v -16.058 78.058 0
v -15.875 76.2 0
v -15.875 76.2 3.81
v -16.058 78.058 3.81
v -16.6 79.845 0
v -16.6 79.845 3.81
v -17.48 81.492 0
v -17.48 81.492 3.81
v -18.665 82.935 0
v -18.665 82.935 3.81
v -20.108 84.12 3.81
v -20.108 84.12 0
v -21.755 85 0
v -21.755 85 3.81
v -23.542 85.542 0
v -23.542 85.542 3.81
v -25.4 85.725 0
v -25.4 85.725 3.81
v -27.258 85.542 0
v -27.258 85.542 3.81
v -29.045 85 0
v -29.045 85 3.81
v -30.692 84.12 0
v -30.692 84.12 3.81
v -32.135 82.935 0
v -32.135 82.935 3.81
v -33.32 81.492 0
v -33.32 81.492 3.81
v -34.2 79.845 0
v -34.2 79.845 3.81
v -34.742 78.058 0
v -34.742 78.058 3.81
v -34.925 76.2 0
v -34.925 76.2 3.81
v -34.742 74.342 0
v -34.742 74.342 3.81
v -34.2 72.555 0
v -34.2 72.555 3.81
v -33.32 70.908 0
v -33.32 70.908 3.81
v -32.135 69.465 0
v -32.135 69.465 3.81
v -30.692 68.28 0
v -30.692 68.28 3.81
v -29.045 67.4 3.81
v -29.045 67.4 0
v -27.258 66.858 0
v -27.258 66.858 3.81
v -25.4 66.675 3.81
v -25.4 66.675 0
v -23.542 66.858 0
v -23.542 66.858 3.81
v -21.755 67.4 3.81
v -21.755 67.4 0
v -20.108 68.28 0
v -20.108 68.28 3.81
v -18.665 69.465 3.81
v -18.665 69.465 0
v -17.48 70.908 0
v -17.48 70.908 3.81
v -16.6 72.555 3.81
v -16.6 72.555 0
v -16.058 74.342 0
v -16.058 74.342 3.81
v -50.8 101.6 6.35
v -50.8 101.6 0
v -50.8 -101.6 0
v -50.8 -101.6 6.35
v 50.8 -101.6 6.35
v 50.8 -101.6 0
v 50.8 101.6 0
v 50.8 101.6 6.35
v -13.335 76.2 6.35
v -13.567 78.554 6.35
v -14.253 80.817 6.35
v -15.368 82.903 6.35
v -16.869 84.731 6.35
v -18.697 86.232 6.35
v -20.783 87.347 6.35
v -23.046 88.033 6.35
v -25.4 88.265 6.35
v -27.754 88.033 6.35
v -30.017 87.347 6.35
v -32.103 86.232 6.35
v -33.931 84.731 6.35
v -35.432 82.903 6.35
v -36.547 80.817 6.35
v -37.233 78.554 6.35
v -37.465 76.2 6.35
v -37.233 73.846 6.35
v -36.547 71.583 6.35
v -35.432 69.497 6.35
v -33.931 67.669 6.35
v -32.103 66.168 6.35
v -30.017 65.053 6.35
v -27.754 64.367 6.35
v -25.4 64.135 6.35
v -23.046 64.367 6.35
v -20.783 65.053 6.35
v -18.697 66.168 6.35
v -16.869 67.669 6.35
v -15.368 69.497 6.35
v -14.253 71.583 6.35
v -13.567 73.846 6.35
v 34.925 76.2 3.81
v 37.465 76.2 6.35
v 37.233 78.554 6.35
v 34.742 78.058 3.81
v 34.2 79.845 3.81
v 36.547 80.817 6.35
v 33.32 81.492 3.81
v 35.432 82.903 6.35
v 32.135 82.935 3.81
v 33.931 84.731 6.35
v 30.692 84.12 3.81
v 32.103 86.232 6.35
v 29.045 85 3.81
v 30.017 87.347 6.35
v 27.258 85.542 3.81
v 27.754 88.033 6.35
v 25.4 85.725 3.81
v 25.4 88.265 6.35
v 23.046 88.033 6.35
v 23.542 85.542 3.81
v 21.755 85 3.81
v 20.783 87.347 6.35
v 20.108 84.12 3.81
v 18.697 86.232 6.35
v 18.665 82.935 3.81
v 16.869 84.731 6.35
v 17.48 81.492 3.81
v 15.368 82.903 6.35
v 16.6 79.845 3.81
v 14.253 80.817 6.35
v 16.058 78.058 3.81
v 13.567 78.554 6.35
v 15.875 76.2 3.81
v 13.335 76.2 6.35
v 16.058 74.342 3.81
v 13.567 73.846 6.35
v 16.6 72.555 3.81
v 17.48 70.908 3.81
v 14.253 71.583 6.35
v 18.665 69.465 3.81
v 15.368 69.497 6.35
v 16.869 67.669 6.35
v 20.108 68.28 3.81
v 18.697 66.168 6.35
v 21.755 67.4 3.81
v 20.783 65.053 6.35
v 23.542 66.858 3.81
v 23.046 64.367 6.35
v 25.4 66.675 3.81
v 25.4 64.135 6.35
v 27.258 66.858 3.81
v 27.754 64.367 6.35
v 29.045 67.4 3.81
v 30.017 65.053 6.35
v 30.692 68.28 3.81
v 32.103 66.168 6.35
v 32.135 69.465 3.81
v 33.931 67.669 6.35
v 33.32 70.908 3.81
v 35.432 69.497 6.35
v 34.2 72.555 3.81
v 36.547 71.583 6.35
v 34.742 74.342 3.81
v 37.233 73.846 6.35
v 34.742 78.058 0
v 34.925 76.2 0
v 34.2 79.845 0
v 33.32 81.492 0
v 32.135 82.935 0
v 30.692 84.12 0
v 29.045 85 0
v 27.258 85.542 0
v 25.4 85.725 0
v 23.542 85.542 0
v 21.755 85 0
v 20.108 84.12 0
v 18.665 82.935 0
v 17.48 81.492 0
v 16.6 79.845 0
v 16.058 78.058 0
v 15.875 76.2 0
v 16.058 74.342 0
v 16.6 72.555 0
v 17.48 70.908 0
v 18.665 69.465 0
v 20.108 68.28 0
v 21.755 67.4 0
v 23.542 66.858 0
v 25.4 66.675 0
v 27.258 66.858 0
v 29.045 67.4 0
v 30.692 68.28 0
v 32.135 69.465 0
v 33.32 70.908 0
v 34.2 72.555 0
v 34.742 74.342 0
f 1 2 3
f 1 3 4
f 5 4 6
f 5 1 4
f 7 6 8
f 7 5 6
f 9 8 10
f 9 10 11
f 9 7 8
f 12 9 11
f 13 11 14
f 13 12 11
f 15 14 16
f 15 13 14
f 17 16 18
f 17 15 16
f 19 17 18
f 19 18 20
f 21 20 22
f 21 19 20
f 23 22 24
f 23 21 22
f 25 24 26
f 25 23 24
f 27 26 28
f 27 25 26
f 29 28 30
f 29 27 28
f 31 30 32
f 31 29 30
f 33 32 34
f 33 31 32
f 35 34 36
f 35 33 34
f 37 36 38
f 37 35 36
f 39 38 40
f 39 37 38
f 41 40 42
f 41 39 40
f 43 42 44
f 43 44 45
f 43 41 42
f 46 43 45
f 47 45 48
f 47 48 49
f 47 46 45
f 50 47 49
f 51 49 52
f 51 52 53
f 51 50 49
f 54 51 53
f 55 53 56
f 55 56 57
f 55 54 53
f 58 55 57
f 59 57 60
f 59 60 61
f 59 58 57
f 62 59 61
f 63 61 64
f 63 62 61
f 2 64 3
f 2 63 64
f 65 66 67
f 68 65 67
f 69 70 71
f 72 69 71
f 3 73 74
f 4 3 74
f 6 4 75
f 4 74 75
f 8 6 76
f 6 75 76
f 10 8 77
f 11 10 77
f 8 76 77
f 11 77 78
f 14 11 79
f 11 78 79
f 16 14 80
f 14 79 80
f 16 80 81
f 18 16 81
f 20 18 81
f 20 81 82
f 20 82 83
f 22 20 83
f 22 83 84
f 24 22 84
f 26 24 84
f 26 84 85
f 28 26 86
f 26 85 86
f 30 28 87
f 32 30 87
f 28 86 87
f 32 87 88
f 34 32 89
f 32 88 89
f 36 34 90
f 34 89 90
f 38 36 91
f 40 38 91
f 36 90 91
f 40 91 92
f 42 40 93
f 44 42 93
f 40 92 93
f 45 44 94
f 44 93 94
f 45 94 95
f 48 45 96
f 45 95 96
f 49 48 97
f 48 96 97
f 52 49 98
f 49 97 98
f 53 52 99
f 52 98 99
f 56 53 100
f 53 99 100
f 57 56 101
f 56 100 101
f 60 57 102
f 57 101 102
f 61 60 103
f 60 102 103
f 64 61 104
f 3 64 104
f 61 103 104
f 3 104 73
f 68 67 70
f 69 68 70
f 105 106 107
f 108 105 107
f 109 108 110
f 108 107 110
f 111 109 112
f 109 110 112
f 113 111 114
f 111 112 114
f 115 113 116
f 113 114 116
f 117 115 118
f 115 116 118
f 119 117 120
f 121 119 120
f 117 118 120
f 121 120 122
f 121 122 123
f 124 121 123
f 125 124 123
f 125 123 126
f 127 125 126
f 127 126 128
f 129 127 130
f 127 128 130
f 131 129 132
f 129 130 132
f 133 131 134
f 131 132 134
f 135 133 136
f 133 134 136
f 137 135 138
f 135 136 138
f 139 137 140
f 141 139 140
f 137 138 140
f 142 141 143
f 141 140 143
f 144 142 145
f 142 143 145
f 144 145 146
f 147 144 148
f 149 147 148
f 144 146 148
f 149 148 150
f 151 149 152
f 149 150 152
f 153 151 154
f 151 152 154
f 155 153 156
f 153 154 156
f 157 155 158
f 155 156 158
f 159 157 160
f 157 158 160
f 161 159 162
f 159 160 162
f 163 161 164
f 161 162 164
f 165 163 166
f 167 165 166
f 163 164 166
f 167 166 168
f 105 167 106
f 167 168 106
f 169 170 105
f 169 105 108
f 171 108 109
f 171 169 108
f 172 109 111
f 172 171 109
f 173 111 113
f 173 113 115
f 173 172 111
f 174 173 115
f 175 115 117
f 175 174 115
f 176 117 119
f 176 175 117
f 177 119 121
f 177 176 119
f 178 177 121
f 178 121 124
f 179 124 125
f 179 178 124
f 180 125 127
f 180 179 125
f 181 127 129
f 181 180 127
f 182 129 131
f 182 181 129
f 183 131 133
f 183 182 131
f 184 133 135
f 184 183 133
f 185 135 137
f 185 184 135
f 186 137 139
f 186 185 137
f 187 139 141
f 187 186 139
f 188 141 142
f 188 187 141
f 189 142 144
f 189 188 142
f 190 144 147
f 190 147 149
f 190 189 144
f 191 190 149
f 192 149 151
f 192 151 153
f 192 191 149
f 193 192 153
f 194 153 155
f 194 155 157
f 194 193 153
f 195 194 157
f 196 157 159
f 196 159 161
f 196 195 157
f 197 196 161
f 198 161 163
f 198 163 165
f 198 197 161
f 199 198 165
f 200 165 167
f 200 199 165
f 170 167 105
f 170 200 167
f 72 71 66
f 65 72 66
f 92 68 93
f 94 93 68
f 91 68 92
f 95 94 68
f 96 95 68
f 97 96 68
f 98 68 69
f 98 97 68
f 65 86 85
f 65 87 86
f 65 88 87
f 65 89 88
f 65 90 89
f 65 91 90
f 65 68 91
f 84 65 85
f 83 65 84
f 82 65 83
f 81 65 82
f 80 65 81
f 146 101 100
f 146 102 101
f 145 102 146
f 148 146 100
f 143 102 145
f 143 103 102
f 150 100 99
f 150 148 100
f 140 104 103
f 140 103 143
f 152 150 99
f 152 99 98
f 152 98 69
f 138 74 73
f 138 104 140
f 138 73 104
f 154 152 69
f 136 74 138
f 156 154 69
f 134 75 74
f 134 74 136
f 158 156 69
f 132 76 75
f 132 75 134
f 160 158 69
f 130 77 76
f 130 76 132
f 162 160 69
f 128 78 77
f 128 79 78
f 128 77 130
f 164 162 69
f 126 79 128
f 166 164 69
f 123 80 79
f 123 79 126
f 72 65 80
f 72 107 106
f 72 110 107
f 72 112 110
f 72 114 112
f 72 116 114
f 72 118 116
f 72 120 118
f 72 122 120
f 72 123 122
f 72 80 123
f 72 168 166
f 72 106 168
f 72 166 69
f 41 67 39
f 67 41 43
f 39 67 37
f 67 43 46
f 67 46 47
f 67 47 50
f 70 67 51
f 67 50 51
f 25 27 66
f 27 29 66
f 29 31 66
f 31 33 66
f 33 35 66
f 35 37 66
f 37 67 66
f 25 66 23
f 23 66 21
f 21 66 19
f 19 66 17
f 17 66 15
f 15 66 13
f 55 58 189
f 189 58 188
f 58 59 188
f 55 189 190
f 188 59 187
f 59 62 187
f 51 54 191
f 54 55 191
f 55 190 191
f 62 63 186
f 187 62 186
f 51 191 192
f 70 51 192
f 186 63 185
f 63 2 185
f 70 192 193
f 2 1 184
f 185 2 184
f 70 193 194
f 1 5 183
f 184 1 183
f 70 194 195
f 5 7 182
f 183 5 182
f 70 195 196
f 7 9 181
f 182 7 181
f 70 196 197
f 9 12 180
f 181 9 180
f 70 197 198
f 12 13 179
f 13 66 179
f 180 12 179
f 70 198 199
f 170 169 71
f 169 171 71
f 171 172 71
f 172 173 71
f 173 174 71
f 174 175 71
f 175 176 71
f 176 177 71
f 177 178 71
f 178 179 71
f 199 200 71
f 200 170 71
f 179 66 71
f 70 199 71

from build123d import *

# Parameters (mm, degrees)
F0_R     = 9.525
F1_DEPTH = 6.35
F2_SIZE  = 2.54


with BuildPart() as f1:
    # F0 (on Top) → F1 (new body)
    with BuildSketch(Plane.XY):
        Polygon((50.8, 101.6), (-50.8, 101.6), (-50.8, 0), (-50.8, -101.6), (50.8, -101.6), (50.8, 0), align=None)
        with Locations((-25.4, 76.2)):
            Circle(F0_R, mode=Mode.SUBTRACT)
        with Locations((25.4, 76.2)):
            Circle(F0_R, mode=Mode.SUBTRACT)
    extrude(amount=F1_DEPTH)

    # F2
    f2_edges = [f1.edges().sort_by_distance(p)[0] for p in [
        (-34.925, 76.2, 6.35),
        (15.875, 76.2, 6.35),
    ]]
    chamfer(f2_edges, length=F2_SIZE)


solid = f1.part
